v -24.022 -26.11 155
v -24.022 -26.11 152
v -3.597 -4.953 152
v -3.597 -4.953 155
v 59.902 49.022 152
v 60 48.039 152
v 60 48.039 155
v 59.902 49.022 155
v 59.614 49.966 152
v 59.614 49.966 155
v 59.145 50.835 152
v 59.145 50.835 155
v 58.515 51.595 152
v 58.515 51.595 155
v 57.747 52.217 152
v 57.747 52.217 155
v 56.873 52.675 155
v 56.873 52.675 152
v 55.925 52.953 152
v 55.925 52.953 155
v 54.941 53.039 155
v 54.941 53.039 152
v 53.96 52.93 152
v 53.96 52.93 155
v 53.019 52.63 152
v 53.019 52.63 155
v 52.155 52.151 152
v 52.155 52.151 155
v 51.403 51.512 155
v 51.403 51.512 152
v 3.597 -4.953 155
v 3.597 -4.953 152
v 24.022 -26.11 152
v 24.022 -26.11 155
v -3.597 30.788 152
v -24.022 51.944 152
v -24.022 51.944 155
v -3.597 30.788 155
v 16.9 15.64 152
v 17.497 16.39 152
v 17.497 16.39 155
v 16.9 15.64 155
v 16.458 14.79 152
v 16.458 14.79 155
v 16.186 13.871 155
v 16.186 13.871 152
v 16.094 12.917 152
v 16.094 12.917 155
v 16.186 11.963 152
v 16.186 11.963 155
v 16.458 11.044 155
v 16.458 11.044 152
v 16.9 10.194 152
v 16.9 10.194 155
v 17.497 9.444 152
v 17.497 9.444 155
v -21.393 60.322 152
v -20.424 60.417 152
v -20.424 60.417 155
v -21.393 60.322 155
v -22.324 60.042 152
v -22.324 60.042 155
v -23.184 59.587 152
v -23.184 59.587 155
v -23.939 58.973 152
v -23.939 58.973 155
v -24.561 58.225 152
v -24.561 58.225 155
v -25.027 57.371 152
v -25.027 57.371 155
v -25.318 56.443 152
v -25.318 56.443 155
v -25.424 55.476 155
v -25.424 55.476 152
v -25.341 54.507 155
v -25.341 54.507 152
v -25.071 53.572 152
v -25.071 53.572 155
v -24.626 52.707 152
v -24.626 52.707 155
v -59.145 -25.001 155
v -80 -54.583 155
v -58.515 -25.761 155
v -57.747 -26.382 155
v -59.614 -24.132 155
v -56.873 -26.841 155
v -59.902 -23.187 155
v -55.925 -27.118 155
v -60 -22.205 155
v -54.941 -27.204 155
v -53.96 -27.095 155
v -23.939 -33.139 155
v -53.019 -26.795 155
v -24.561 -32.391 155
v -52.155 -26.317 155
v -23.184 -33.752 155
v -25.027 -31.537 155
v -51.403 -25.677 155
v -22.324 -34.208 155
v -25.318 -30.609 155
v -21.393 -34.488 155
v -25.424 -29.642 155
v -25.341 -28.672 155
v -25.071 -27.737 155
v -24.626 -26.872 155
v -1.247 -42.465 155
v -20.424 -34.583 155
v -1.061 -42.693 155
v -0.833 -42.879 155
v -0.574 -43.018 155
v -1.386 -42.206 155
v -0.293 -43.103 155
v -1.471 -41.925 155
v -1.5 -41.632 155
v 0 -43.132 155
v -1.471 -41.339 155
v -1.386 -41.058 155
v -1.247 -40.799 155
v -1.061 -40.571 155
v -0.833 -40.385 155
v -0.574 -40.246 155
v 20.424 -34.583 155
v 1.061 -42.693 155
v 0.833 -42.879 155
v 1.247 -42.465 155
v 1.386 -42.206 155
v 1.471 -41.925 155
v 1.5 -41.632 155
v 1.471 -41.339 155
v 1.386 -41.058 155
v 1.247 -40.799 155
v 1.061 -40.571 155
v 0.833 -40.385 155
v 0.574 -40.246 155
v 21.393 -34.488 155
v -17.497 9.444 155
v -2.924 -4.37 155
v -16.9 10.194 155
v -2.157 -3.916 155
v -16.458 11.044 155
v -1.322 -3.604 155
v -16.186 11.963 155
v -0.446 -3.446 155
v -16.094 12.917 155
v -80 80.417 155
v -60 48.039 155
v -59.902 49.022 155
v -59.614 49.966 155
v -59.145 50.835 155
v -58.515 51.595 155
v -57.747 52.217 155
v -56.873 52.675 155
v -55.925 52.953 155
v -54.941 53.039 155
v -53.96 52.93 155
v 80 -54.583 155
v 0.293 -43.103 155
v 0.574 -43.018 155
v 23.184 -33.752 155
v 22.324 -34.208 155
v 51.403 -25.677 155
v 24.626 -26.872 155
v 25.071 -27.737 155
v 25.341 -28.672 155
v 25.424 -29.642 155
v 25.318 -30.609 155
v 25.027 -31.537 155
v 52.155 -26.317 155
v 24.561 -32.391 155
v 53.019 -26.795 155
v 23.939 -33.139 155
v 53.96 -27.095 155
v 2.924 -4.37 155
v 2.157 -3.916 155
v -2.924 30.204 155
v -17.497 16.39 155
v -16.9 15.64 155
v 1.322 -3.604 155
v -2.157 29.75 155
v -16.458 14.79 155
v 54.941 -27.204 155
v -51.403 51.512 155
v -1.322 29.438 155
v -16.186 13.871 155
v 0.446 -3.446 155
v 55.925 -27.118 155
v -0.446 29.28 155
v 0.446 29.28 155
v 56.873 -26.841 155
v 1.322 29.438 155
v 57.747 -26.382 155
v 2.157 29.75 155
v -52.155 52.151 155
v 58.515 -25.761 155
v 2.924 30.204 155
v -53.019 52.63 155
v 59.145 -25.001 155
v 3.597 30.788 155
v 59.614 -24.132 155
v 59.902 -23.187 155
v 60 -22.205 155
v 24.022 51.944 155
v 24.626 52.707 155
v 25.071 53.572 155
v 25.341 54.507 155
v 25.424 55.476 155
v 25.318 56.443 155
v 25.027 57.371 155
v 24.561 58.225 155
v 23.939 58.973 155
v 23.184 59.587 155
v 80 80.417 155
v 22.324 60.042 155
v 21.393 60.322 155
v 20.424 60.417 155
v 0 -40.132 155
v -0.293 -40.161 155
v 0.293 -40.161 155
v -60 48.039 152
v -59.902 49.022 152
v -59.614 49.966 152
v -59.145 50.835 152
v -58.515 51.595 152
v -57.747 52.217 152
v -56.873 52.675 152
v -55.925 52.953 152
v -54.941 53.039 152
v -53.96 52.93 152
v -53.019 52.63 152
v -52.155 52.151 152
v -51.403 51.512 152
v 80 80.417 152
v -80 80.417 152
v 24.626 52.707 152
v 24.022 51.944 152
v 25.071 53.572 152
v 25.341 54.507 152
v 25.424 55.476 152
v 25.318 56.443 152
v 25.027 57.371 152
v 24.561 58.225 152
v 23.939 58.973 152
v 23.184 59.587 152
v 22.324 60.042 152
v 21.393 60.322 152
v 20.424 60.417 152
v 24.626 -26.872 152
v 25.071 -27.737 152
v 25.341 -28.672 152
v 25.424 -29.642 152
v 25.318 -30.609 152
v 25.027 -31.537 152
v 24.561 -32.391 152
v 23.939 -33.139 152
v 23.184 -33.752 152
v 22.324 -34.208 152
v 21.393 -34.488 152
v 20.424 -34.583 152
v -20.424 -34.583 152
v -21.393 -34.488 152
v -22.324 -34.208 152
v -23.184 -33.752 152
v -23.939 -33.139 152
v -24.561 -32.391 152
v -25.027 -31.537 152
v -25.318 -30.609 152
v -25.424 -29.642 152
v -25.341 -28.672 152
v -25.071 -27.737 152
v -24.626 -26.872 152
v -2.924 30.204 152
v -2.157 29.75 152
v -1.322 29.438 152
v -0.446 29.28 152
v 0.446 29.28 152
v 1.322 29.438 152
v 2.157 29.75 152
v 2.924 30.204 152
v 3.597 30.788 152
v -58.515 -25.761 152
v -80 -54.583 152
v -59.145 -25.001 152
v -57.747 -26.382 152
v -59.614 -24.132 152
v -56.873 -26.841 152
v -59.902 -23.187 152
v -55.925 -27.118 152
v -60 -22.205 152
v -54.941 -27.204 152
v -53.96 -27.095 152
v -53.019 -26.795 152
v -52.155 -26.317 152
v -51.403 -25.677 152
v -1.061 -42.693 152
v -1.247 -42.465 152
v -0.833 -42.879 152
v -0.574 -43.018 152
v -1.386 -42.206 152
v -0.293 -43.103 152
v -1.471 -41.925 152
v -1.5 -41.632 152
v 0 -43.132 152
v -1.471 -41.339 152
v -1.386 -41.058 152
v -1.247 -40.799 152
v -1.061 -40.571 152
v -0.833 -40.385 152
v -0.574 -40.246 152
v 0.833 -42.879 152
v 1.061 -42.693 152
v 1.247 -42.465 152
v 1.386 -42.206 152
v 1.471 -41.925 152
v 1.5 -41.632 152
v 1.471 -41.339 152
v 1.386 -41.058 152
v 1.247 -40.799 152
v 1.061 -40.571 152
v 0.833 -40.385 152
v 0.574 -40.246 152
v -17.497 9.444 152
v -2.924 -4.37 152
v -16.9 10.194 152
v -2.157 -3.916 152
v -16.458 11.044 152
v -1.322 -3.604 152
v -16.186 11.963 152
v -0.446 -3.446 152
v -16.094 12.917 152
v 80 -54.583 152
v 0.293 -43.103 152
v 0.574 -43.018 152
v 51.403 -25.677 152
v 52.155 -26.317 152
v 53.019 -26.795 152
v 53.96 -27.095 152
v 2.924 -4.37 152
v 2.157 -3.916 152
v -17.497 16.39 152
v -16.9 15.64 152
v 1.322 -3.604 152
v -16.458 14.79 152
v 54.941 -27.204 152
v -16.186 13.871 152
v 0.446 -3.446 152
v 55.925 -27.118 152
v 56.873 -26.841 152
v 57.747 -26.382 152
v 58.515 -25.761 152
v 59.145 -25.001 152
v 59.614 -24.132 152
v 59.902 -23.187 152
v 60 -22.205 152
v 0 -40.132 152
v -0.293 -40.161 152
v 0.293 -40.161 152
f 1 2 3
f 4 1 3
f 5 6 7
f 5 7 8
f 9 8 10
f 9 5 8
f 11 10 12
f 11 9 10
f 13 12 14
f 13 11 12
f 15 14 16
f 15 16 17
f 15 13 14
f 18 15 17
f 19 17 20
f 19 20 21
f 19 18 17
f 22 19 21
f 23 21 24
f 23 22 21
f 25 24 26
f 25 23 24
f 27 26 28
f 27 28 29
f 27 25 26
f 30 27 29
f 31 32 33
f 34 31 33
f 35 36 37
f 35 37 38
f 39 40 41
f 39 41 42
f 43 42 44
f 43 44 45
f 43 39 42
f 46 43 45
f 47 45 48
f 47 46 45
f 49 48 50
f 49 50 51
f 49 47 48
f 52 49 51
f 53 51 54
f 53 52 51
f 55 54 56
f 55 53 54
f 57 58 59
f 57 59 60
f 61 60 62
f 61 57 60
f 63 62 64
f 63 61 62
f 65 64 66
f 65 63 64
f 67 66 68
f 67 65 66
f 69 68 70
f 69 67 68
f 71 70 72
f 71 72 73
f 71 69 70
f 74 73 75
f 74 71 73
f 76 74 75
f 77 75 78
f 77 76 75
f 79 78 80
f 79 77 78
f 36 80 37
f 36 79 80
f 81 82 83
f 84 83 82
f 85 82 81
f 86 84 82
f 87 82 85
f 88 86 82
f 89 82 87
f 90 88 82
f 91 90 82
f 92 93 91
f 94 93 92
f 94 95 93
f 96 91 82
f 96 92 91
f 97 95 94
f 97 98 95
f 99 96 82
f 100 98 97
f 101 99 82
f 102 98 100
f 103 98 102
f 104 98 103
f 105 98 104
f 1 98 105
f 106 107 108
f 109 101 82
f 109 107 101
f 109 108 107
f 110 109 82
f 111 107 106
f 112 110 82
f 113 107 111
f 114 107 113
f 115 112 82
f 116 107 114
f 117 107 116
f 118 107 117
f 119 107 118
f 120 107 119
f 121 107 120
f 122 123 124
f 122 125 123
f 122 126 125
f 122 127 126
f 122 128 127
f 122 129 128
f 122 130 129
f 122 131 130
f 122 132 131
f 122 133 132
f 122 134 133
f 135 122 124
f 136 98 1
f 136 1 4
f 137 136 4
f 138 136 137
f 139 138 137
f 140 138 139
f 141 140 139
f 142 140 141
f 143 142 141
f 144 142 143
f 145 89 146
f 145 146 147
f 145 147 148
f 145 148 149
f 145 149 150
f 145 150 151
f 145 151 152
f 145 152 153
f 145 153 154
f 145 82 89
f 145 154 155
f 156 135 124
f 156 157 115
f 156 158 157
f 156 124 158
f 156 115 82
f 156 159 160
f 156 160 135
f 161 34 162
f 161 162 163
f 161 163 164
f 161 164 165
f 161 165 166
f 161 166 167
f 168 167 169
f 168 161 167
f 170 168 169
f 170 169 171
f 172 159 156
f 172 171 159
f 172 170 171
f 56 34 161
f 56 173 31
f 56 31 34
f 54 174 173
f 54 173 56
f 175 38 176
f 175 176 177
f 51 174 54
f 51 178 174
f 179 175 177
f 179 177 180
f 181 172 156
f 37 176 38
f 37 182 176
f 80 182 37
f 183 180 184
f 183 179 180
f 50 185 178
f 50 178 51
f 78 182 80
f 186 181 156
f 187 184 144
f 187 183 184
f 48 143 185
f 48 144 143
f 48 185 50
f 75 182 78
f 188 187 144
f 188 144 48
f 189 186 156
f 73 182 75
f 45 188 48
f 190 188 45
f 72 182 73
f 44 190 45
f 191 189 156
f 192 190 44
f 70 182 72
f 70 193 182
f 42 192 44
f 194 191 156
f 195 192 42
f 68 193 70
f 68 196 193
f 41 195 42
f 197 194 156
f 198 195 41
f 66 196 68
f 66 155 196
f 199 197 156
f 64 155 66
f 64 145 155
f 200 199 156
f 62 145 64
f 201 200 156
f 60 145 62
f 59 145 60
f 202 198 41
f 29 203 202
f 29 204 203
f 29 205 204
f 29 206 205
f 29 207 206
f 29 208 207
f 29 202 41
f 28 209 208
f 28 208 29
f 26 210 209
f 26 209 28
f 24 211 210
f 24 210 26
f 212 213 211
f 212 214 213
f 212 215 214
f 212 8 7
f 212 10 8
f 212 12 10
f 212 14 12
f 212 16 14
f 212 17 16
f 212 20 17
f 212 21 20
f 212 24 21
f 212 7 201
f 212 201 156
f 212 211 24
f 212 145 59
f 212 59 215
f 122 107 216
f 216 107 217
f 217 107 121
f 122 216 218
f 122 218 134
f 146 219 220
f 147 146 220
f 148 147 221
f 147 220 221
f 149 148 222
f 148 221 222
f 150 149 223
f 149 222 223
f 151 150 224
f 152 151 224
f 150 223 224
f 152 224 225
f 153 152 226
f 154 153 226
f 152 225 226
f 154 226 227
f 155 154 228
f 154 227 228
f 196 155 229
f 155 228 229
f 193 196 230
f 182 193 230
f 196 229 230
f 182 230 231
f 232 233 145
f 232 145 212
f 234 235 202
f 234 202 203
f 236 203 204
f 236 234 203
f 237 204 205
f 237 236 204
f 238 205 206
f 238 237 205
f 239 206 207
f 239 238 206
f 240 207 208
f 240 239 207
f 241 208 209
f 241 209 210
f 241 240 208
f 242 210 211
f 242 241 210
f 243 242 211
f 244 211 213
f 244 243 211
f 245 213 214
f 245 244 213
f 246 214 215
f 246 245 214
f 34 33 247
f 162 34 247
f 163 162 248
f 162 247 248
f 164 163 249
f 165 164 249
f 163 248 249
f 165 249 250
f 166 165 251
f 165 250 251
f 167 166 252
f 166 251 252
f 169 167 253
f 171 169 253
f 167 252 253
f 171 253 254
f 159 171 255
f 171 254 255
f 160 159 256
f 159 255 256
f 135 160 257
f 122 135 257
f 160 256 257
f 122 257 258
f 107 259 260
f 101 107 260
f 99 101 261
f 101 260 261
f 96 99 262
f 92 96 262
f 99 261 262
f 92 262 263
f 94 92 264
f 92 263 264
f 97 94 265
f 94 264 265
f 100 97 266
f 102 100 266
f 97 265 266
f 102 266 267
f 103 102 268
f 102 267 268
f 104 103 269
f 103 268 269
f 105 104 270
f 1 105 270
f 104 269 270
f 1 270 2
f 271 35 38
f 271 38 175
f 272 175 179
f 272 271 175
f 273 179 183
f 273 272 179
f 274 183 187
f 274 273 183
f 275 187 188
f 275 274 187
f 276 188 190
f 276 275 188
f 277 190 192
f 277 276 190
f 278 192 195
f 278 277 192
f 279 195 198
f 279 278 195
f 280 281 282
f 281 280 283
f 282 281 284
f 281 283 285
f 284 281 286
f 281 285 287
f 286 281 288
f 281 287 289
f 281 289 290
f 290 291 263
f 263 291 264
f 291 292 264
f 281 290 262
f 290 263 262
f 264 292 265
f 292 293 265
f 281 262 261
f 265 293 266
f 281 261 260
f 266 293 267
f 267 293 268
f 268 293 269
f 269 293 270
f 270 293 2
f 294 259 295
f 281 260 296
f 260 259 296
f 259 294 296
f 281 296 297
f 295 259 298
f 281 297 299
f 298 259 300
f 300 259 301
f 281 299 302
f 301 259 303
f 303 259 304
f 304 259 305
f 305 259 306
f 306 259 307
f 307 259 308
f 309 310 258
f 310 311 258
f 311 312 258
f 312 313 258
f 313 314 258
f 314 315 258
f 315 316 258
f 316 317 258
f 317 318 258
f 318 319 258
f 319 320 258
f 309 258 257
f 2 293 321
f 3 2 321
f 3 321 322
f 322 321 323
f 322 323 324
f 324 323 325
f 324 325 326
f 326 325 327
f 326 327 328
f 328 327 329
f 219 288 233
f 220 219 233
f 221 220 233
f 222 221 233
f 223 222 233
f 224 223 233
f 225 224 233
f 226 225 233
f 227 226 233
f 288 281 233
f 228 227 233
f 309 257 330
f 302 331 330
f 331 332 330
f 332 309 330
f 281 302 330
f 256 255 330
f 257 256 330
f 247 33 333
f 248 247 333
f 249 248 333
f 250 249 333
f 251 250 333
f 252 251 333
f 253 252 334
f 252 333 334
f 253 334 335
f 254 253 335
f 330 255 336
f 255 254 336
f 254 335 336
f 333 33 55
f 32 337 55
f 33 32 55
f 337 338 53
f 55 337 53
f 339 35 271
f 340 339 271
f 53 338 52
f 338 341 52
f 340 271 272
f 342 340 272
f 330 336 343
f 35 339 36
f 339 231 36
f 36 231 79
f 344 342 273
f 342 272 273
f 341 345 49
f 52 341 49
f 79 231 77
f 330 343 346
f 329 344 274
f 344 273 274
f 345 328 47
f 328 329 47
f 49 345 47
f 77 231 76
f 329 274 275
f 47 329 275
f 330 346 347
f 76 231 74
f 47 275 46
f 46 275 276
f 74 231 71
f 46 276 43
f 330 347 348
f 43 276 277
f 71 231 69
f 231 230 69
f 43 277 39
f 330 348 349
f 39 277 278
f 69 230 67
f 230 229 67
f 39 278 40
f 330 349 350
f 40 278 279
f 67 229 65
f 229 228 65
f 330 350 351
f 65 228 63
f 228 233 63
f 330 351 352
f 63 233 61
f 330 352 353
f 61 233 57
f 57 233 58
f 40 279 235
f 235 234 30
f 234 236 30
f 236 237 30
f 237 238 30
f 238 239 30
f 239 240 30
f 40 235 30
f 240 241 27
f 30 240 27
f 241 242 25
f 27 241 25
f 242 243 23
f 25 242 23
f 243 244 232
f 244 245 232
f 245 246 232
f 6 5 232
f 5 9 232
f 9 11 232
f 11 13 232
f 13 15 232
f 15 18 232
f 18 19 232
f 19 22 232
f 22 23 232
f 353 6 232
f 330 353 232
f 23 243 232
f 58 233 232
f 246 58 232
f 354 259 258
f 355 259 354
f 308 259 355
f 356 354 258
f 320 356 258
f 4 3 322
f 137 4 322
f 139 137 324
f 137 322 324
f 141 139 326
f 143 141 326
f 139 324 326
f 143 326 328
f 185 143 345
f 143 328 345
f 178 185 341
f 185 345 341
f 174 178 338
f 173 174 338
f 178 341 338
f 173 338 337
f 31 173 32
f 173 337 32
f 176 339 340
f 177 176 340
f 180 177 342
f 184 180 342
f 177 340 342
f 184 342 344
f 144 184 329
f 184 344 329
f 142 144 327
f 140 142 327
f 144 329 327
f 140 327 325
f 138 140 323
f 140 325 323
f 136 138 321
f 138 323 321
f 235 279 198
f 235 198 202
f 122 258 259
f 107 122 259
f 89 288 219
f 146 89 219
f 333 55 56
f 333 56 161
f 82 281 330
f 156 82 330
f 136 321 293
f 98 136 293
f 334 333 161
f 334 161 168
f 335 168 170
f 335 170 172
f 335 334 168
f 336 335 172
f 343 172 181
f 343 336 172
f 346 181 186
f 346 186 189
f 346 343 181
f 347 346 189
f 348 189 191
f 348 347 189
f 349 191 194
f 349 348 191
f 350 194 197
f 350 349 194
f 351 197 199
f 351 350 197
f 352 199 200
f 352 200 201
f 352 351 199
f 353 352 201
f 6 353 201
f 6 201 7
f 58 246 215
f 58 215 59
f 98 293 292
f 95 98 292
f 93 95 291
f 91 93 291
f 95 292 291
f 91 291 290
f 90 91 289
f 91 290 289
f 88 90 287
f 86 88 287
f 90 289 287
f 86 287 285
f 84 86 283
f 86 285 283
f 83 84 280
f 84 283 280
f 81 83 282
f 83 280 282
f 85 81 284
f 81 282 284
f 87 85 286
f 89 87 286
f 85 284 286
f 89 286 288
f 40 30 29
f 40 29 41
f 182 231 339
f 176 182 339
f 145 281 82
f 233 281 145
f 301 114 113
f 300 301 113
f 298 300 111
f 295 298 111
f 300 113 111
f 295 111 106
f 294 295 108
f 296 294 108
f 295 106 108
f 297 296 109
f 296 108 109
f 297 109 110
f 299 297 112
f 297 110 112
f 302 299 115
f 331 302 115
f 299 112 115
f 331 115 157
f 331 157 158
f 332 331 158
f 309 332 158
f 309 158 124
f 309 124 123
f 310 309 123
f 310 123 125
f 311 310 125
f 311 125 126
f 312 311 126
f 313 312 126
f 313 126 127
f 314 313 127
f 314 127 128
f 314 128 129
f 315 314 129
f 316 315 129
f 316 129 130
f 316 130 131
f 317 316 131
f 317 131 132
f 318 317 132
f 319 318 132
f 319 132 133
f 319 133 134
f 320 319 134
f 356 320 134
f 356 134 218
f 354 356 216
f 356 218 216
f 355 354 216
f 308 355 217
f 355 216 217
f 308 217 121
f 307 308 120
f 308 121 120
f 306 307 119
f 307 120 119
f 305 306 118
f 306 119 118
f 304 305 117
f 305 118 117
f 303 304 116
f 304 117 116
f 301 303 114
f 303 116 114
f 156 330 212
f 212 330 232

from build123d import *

# Parameters (mm, degrees)
SKETCH1_W           = 160
SKETCH1_H           = 135
BOSS_EXTRUDE1_DEPTH = 3
CUT_EXTRUDE1_DEPTH  = 20


with BuildPart() as part:
    # Sketch1 → Boss-Extrude1 (new body)
    with BuildSketch(Plane.XY.offset(152)):
        with Locations((0, 12.91714511)):
            Rectangle(SKETCH1_W, SKETCH1_H)
        with BuildLine():
            Line((-60, -22.204596664), (-60, 48.038886885))
            ThreePointArc((-60, 48.038886885), (-56.872665603, 52.674954566), (-51.402750584, 51.511608676))
            Line((-51.402750584, 51.511608676), (-17.49683417, 16.389866902))
            ThreePointArc((-17.49683417, 16.389866902), (-16.094083586, 12.91714511), (-17.49683417, 9.444423319))
            Line((-17.49683417, 9.444423319), (-51.402750584, -25.677318456))
            ThreePointArc((-51.402750584, -25.677318456), (-56.872665603, -26.840664345), (-60, -22.204596664))
        make_face(mode=Mode.SUBTRACT)
        with BuildLine():
            Line((20.424315219, 60.41714511), (-20.424315219, 60.41714511))
            ThreePointArc((-20.424315219, 60.41714511), (-25.026684661, 57.371165459), (-24.021564635, 51.944423319))
            Line((-24.021564635, 51.944423319), (-3.597249416, 30.787716735))
            ThreePointArc((-3.597249416, 30.787716735), (0, 29.260438526), (3.597249416, 30.787716735))
            Line((3.597249416, 30.787716735), (24.021564635, 51.944423319))
            ThreePointArc((24.021564635, 51.944423319), (25.026684661, 57.371165459), (20.424315219, 60.41714511))
        make_face(mode=Mode.SUBTRACT)
        with BuildLine():
            Line((51.402750584, 51.511608676), (17.49683417, 16.389866902))
            ThreePointArc((17.49683417, 16.389866902), (16.094083586, 12.91714511), (17.49683417, 9.444423319))
            Line((17.49683417, 9.444423319), (51.402750584, -25.677318456))
            ThreePointArc((51.402750584, -25.677318456), (56.872665603, -26.840664345), (60, -22.204596664))
            Line((60, -22.204596664), (60, 48.038886885))
            ThreePointArc((60, 48.038886885), (56.872665603, 52.674954566), (51.402750584, 51.511608676))
        make_face(mode=Mode.SUBTRACT)
        with BuildLine():
            Line((-24.021564635, -26.110133098), (-3.597249416, -4.953426514))
            ThreePointArc((-3.597249416, -4.953426514), (0, -3.426148305), (3.597249416, -4.953426514))
            Line((3.597249416, -4.953426514), (24.021564635, -26.110133098))
            ThreePointArc((24.021564635, -26.110133098), (25.026684661, -31.536875238), (20.424315219, -34.58285489))
            Line((20.424315219, -34.58285489), (-20.424315219, -34.58285489))
            ThreePointArc((-20.424315219, -34.58285489), (-25.026684661, -31.536875238), (-24.021564635, -26.110133098))
        make_face(mode=Mode.SUBTRACT)
    extrude(amount=BOSS_EXTRUDE1_DEPTH)

    # Sketch2 → Cut-Extrude1 (cut)
    with BuildSketch(Plane.XY.offset(155)):
        with BuildLine():
            ThreePointArc((1.5, -41.631936217), (0, -40.131936217), (-1.5, -41.631936217))
            Line((-1.5, -41.631936217), (1.5, -41.631936217))
        make_face()
        with BuildLine():
            Line((1.5, -41.631936217), (-1.5, -41.631936217))
            ThreePointArc((-1.5, -41.631936217), (0, -43.131936217), (1.5, -41.631936217))
        make_face()
    extrude(amount=-CUT_EXTRUDE1_DEPTH, mode=Mode.SUBTRACT)


solid = part.part
